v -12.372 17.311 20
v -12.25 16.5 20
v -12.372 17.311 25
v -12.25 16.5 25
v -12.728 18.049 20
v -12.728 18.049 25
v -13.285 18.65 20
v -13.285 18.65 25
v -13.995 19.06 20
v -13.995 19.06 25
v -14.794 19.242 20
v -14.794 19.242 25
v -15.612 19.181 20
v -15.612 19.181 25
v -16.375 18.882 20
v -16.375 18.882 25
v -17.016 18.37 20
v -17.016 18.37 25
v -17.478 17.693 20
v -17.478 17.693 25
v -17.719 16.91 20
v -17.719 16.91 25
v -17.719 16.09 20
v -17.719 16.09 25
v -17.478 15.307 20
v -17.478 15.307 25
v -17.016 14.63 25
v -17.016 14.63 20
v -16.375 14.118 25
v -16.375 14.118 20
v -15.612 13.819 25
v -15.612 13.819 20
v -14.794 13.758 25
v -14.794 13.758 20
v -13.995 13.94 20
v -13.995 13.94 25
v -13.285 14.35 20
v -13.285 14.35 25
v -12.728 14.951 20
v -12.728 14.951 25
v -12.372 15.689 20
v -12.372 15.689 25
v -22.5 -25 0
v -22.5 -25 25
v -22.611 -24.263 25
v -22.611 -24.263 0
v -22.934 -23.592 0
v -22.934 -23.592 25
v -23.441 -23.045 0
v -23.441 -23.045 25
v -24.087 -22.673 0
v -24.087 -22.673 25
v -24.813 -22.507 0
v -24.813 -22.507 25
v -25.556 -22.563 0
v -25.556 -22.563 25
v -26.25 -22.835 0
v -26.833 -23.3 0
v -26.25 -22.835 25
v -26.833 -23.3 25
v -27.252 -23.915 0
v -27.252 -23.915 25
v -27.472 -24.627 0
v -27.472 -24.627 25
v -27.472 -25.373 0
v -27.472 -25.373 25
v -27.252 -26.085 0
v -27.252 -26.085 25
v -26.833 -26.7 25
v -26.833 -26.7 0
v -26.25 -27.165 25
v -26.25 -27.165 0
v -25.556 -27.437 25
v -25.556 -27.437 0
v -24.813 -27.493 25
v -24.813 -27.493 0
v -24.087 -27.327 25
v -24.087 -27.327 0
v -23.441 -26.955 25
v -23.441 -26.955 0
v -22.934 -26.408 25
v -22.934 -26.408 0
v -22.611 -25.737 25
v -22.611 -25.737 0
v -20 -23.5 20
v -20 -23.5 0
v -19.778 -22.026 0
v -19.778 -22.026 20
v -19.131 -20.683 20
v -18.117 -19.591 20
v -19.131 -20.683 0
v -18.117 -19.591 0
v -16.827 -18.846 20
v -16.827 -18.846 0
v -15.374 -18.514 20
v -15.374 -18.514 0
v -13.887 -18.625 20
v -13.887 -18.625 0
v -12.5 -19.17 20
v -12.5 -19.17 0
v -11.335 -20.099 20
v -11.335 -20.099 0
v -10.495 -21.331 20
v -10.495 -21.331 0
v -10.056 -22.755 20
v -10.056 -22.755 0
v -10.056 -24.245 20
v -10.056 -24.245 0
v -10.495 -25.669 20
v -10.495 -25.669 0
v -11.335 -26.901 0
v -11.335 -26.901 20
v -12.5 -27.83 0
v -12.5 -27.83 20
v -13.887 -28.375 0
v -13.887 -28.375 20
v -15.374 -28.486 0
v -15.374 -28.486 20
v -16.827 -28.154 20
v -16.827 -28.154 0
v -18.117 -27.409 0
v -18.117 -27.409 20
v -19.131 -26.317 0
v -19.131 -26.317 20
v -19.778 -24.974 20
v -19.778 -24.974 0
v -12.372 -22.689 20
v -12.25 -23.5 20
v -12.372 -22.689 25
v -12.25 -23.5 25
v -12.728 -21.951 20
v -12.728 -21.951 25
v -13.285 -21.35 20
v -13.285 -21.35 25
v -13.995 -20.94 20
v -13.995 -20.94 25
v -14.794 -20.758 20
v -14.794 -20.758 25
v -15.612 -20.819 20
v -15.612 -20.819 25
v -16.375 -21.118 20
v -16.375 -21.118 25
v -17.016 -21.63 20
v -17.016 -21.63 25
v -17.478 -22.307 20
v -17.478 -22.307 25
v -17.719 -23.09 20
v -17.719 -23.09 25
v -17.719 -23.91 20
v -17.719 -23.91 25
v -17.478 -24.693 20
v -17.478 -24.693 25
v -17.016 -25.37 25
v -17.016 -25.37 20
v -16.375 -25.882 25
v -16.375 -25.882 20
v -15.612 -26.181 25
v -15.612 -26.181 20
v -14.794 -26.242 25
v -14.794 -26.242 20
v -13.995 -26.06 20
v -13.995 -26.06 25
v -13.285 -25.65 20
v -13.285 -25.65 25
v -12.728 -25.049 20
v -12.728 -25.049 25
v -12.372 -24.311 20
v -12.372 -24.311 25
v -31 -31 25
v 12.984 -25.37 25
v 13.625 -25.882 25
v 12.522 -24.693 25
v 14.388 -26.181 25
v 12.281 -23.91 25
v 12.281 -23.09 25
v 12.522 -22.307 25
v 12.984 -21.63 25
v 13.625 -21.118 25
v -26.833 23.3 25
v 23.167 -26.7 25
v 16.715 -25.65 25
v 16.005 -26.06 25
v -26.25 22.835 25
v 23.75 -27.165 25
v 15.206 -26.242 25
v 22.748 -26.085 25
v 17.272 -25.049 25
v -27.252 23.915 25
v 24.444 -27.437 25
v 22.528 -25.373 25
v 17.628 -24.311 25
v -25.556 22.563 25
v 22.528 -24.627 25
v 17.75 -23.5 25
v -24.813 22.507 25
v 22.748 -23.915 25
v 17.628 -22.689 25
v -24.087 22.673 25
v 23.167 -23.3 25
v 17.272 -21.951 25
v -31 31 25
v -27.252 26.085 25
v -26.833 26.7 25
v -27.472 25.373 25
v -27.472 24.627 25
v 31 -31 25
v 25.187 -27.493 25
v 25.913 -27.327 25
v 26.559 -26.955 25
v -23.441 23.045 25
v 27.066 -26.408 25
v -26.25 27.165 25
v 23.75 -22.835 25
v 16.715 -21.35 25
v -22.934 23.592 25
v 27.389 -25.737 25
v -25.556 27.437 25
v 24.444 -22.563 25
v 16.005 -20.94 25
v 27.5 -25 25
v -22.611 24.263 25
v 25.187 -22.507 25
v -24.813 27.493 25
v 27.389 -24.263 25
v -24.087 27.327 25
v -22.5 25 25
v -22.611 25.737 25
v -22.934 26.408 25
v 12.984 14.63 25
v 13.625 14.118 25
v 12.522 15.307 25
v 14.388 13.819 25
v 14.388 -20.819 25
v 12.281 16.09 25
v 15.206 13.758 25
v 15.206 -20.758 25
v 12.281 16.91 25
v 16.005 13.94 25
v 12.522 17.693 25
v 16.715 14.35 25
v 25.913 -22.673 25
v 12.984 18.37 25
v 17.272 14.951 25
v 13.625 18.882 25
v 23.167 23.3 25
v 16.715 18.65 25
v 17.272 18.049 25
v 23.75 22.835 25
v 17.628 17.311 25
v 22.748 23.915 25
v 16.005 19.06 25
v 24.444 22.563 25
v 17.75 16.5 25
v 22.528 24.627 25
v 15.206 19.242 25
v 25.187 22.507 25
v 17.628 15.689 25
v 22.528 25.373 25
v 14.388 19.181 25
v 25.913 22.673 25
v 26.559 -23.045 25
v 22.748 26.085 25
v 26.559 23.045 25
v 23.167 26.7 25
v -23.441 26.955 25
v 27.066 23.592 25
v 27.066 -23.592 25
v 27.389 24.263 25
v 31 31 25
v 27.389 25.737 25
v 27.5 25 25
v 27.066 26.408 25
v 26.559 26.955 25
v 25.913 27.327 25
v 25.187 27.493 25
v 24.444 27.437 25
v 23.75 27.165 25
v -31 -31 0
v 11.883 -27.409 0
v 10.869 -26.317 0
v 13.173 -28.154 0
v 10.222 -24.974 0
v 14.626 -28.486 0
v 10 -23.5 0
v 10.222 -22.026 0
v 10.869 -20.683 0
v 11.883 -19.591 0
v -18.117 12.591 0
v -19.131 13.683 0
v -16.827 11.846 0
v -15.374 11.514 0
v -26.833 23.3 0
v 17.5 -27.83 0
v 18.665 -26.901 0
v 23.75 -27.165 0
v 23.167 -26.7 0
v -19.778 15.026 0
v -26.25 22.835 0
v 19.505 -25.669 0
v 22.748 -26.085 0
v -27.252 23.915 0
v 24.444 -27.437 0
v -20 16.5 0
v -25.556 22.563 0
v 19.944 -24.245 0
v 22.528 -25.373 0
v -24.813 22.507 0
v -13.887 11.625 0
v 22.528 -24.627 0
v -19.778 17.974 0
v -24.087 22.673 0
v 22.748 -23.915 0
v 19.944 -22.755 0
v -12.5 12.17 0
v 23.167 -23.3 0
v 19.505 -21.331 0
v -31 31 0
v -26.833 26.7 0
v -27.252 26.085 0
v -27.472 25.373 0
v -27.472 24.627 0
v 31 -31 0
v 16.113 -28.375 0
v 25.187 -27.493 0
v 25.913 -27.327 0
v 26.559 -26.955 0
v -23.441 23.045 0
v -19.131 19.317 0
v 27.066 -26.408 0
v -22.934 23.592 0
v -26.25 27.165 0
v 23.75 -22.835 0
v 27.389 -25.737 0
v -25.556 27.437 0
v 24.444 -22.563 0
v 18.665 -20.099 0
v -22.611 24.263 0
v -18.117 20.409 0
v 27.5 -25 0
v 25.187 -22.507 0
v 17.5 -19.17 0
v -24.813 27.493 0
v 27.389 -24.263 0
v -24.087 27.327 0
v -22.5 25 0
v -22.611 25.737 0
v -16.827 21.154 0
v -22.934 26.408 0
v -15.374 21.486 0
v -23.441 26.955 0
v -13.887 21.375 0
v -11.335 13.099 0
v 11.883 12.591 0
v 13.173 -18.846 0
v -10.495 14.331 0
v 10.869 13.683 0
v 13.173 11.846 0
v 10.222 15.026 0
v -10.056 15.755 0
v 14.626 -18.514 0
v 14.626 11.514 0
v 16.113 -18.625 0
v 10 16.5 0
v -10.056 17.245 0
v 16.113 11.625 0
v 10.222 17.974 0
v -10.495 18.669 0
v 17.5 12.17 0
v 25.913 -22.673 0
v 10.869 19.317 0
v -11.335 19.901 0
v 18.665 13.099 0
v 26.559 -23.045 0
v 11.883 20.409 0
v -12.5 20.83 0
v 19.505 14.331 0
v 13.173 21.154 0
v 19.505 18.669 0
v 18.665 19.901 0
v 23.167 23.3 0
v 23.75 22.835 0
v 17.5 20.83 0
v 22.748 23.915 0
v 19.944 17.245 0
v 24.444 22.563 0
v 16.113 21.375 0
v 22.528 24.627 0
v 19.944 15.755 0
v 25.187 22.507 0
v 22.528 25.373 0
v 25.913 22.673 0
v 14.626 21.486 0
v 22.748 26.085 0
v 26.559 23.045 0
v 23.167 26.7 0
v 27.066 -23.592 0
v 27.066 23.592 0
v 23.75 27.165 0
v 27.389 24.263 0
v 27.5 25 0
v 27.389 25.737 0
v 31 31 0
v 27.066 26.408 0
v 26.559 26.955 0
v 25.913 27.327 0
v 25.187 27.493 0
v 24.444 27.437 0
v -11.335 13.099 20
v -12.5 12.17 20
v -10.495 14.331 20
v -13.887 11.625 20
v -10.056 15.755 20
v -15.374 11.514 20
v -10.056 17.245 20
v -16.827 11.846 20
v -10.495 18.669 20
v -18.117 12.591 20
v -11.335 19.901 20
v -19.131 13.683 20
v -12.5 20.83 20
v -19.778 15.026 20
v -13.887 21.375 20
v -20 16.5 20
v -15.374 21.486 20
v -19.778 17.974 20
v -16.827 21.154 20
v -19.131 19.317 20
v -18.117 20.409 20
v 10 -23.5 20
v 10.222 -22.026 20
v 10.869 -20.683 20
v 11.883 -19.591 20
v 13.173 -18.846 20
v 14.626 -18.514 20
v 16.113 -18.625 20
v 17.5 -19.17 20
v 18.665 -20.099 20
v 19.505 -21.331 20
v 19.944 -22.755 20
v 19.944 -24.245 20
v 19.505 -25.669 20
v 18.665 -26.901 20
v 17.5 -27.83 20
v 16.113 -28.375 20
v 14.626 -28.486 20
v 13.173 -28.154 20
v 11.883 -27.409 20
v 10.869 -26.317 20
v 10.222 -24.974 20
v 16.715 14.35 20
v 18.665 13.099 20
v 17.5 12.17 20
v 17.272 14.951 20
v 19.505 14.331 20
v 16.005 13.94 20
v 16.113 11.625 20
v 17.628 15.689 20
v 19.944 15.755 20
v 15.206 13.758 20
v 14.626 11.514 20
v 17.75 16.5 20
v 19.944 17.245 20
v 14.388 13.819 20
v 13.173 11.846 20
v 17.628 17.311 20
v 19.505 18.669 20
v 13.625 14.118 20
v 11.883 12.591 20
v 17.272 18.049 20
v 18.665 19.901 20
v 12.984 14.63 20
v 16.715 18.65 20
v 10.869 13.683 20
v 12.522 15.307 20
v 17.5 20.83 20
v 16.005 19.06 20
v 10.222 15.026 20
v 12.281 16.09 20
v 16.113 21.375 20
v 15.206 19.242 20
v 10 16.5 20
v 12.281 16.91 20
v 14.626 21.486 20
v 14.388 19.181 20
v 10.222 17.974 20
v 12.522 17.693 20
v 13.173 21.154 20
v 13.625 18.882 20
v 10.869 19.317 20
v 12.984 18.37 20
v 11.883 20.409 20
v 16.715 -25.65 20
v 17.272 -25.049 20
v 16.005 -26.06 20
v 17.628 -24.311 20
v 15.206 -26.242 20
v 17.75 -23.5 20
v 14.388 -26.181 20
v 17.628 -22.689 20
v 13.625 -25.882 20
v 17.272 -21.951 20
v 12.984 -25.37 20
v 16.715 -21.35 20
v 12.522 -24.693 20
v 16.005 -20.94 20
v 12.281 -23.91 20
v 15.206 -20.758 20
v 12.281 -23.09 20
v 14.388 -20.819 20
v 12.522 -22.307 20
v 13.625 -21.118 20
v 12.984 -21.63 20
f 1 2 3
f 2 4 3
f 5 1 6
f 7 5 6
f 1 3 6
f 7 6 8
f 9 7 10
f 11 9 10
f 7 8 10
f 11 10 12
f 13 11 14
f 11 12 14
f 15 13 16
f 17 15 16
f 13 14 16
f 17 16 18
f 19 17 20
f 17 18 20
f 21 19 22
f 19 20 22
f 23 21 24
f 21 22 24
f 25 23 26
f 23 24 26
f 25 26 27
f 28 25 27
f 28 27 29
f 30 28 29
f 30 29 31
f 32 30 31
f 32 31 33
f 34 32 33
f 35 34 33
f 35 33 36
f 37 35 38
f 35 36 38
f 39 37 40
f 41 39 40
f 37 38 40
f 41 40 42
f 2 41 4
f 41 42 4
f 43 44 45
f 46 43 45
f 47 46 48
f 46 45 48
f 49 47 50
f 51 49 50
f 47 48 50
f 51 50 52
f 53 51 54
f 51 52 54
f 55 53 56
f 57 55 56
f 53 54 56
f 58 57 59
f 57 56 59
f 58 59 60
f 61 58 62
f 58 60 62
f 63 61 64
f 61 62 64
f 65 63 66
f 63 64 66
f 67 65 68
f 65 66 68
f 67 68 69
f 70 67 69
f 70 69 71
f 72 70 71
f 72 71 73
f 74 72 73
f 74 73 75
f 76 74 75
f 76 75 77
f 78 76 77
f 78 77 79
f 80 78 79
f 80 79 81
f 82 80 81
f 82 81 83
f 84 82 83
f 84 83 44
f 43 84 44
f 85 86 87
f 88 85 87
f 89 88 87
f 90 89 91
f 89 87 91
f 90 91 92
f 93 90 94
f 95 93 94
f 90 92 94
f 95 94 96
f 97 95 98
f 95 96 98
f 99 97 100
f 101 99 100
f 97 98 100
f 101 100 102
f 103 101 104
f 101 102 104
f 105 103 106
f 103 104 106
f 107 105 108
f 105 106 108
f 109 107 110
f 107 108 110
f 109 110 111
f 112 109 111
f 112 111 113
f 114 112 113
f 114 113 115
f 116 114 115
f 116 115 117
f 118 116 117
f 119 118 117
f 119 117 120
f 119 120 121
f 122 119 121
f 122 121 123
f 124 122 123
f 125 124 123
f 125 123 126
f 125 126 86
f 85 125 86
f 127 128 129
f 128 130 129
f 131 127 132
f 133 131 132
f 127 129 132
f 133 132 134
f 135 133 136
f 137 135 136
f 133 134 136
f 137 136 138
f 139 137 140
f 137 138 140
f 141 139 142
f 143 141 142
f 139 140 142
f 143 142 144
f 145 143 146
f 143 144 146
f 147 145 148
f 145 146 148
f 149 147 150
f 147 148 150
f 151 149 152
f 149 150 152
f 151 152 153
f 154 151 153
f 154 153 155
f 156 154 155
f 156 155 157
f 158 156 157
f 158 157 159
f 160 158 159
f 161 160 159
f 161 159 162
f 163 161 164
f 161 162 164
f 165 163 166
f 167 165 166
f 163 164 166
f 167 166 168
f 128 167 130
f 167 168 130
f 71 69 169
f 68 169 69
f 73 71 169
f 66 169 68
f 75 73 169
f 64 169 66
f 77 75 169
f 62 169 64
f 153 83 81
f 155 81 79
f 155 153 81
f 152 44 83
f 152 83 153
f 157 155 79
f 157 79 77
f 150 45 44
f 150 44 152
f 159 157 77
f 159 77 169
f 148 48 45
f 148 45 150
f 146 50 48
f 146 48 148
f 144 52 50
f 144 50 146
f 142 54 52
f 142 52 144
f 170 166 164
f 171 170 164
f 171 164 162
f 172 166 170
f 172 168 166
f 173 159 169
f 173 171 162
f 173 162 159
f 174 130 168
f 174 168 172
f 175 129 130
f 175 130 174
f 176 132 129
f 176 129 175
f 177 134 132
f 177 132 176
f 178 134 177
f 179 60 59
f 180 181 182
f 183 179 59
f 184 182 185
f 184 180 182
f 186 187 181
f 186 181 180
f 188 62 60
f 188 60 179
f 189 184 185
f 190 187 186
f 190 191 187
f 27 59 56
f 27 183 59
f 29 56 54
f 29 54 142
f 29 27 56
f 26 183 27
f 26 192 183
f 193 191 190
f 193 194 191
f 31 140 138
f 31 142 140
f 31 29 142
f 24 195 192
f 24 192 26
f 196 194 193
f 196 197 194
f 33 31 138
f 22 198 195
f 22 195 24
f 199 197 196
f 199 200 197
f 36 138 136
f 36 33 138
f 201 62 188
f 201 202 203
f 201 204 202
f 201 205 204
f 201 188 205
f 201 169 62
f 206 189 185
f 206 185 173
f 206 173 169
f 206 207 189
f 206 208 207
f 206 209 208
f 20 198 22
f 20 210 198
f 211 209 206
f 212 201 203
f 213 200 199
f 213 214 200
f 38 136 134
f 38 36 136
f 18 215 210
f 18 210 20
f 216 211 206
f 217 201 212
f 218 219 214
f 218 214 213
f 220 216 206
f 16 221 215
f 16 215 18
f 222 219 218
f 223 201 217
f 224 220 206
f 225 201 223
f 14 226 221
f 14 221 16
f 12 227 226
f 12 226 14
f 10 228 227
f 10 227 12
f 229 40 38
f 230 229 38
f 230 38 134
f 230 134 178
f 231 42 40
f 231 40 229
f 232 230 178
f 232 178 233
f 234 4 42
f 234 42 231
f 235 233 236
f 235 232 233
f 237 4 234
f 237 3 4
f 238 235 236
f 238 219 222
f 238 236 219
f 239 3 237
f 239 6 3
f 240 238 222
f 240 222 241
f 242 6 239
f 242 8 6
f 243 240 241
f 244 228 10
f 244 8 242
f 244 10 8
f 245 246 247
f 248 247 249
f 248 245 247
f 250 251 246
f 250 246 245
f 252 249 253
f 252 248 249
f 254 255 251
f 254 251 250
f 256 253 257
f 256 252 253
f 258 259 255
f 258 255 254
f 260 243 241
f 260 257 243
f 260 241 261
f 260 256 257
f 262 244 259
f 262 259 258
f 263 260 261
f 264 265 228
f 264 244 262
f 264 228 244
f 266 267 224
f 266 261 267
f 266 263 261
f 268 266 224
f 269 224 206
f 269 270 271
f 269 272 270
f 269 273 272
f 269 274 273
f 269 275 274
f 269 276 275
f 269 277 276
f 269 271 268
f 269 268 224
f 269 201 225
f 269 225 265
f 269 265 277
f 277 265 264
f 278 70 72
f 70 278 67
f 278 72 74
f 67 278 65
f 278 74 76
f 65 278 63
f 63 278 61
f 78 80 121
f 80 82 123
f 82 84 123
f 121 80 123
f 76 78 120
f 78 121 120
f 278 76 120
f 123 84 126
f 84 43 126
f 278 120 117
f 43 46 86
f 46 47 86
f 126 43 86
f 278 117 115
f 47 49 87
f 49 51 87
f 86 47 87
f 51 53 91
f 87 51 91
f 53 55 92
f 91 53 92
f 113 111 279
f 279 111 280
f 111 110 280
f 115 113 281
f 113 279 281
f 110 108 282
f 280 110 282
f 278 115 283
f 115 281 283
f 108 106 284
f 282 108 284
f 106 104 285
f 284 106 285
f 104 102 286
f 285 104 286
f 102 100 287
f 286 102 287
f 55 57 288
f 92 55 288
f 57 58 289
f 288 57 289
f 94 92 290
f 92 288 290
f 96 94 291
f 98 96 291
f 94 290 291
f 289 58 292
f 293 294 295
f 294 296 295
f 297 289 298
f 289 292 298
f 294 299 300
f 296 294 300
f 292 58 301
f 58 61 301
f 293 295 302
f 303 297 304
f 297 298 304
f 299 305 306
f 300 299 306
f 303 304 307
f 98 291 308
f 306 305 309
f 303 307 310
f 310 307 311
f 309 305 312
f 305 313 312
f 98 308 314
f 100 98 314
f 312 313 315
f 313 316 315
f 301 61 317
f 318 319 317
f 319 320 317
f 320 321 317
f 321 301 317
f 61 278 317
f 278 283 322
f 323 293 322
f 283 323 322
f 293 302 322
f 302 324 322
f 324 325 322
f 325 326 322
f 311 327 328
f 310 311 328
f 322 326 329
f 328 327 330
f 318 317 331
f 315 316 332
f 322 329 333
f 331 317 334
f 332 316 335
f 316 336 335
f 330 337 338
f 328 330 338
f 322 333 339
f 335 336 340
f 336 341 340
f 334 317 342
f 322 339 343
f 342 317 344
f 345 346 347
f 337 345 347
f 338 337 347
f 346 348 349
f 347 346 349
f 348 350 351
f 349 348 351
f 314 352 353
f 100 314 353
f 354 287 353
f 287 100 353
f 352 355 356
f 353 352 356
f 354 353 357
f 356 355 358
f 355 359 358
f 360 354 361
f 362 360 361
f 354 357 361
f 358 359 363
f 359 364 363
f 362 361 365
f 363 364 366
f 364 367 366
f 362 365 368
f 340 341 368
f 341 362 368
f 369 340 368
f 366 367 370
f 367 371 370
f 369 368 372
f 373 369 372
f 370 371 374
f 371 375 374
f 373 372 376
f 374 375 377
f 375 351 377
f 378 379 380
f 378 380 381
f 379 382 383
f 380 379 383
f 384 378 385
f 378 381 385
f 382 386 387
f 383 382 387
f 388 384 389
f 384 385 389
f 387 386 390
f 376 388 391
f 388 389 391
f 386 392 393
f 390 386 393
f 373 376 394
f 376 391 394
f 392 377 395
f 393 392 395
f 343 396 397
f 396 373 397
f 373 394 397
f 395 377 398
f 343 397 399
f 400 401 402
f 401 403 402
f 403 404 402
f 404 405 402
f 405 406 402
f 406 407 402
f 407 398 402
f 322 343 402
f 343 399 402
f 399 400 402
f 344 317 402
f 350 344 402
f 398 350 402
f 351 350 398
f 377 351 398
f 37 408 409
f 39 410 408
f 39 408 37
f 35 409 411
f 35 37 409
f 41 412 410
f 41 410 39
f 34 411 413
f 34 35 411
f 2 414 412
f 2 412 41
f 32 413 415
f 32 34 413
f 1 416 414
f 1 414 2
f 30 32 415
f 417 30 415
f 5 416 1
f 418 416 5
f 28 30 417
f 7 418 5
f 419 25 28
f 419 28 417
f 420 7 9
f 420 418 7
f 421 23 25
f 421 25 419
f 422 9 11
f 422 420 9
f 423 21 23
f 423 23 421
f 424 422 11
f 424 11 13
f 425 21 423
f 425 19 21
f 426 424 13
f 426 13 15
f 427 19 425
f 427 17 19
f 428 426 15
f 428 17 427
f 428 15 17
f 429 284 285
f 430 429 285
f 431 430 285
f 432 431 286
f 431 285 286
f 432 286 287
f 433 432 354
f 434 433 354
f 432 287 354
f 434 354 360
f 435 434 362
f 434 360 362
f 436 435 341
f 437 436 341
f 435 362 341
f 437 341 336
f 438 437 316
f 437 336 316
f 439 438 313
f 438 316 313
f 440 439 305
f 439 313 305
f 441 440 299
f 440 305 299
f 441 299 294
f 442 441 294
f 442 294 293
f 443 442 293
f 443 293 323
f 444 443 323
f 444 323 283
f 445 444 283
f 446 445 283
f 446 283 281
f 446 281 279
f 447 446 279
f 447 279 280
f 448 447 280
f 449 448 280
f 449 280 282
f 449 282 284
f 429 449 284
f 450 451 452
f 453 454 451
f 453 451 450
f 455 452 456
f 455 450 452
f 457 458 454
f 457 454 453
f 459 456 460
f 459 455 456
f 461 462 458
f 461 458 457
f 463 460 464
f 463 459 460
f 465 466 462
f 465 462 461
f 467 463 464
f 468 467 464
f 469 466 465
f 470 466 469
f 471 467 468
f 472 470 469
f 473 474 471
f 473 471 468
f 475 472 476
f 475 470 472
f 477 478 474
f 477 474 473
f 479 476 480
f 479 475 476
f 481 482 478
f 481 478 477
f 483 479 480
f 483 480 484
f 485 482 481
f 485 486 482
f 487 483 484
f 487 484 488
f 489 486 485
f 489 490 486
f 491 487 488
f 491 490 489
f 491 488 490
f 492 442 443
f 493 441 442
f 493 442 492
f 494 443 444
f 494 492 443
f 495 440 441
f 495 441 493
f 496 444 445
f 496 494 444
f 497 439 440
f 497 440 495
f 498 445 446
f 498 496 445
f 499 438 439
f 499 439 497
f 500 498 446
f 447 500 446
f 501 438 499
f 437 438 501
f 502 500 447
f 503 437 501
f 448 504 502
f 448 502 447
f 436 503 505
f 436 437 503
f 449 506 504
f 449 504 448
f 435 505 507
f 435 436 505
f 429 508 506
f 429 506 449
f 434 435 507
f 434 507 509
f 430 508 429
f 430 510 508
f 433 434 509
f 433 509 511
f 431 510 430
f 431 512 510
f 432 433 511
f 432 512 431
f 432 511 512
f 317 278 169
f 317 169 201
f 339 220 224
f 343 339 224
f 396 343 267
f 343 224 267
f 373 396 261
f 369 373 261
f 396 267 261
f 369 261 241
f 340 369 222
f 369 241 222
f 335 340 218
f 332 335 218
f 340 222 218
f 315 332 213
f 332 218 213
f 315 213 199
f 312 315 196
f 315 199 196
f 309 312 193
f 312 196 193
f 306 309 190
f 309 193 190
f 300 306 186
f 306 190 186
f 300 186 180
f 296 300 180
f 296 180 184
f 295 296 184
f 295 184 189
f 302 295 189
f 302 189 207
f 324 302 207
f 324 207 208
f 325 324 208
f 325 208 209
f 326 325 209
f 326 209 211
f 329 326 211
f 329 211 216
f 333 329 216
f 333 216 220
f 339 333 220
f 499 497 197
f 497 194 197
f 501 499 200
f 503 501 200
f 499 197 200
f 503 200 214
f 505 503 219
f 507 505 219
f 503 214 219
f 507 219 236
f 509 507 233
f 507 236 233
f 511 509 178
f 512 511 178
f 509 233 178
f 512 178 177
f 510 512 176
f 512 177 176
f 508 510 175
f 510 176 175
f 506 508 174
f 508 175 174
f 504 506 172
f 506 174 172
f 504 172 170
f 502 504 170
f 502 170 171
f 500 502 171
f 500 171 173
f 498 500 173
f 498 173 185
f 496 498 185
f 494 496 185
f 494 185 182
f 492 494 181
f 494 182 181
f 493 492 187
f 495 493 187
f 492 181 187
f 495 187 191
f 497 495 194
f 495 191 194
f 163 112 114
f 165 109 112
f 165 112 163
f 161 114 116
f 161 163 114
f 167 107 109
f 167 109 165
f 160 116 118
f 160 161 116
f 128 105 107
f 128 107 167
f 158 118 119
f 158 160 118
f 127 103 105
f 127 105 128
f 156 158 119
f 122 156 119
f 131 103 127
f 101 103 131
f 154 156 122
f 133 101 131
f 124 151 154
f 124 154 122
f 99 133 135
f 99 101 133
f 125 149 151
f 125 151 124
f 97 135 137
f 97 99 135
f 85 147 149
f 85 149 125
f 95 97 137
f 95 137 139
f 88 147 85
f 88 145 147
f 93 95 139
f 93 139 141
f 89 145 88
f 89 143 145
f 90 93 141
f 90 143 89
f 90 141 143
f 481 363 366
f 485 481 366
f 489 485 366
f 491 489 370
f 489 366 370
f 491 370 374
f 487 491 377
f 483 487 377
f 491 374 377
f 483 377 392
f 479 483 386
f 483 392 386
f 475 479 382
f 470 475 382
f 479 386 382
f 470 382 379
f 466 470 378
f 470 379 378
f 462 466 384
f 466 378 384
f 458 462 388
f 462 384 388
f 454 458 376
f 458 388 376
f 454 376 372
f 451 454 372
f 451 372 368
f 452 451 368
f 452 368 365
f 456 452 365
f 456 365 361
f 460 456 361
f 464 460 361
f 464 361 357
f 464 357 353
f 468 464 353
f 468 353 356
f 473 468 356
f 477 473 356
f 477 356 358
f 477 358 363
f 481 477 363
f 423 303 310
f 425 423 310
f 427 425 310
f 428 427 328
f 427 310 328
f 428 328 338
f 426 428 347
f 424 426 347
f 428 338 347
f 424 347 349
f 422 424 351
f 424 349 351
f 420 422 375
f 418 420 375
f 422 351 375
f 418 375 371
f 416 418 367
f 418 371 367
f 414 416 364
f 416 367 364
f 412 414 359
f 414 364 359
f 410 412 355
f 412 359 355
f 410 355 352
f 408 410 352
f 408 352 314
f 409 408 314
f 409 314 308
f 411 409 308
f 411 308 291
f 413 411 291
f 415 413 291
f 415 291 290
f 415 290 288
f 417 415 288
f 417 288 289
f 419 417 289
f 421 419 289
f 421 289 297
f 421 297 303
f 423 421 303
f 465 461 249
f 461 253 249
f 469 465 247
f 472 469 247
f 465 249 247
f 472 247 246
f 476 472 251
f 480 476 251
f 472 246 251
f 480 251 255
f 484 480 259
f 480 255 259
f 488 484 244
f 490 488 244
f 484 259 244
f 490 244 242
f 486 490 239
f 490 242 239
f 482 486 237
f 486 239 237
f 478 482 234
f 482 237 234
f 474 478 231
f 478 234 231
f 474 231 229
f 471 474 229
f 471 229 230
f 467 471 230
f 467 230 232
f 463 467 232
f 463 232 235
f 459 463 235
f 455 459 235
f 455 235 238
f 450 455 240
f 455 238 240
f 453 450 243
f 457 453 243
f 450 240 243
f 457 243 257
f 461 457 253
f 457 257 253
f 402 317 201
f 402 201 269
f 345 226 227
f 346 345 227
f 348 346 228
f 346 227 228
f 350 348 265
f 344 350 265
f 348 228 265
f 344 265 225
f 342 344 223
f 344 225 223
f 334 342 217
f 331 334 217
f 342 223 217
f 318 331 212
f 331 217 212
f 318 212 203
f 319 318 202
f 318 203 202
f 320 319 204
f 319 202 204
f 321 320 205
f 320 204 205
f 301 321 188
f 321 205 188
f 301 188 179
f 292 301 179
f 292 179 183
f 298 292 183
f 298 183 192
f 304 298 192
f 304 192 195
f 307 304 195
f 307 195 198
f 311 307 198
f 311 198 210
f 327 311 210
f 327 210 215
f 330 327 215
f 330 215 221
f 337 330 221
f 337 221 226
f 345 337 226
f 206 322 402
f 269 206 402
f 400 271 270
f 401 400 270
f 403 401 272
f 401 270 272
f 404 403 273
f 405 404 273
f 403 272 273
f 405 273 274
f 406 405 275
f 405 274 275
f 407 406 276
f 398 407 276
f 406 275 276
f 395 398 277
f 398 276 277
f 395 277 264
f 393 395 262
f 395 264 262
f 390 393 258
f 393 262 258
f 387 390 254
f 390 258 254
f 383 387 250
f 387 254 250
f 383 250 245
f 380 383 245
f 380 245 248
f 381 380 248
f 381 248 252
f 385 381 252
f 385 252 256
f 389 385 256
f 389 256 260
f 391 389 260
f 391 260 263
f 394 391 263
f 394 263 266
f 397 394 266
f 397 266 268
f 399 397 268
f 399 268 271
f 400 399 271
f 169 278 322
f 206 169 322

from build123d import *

# Parameters (mm, degrees)
SKETCH_1_W                   = 62
SKETCH_1_H                   = 62
EXTRUDE_1_DEPTH              = 25
HOLE_WIZARD_M6_1_D           = 5
HOLE_WIZARD_M5_1_D           = 5.5
HOLE_WIZARD_M5_1_CBORE_D     = 10
HOLE_WIZARD_M5_1_CBORE_DEPTH = 20


with BuildPart() as part:
    # 草图1 → 凸台-拉伸1 (new body)
    with BuildSketch(Plane.XY):
        Rectangle(SKETCH_1_W, SKETCH_1_H)
    extrude(amount=EXTRUDE_1_DEPTH)

    # M6 螺纹孔1 (through all)
    with Locations(Plane(origin=(25, 25, 0), x_dir=(-1, 0, 0), z_dir=(0, 0, -1))):
        with Locations((0, 0), (50, 0), (0, -50), (50, -50)):
            Hole(HOLE_WIZARD_M6_1_D / 2)

    # M5 六角凹头螺钉的柱形沉头孔1 (through all)
    with Locations(Plane(origin=(15, 16.5, 0), x_dir=(-1, 0, 0), z_dir=(0, 0, -1))):
        with Locations((0, 0), (30, 0), (30, -40), (0, -40)):
            CounterBoreHole(HOLE_WIZARD_M5_1_D / 2, HOLE_WIZARD_M5_1_CBORE_D / 2, HOLE_WIZARD_M5_1_CBORE_DEPTH)


solid = part.part
